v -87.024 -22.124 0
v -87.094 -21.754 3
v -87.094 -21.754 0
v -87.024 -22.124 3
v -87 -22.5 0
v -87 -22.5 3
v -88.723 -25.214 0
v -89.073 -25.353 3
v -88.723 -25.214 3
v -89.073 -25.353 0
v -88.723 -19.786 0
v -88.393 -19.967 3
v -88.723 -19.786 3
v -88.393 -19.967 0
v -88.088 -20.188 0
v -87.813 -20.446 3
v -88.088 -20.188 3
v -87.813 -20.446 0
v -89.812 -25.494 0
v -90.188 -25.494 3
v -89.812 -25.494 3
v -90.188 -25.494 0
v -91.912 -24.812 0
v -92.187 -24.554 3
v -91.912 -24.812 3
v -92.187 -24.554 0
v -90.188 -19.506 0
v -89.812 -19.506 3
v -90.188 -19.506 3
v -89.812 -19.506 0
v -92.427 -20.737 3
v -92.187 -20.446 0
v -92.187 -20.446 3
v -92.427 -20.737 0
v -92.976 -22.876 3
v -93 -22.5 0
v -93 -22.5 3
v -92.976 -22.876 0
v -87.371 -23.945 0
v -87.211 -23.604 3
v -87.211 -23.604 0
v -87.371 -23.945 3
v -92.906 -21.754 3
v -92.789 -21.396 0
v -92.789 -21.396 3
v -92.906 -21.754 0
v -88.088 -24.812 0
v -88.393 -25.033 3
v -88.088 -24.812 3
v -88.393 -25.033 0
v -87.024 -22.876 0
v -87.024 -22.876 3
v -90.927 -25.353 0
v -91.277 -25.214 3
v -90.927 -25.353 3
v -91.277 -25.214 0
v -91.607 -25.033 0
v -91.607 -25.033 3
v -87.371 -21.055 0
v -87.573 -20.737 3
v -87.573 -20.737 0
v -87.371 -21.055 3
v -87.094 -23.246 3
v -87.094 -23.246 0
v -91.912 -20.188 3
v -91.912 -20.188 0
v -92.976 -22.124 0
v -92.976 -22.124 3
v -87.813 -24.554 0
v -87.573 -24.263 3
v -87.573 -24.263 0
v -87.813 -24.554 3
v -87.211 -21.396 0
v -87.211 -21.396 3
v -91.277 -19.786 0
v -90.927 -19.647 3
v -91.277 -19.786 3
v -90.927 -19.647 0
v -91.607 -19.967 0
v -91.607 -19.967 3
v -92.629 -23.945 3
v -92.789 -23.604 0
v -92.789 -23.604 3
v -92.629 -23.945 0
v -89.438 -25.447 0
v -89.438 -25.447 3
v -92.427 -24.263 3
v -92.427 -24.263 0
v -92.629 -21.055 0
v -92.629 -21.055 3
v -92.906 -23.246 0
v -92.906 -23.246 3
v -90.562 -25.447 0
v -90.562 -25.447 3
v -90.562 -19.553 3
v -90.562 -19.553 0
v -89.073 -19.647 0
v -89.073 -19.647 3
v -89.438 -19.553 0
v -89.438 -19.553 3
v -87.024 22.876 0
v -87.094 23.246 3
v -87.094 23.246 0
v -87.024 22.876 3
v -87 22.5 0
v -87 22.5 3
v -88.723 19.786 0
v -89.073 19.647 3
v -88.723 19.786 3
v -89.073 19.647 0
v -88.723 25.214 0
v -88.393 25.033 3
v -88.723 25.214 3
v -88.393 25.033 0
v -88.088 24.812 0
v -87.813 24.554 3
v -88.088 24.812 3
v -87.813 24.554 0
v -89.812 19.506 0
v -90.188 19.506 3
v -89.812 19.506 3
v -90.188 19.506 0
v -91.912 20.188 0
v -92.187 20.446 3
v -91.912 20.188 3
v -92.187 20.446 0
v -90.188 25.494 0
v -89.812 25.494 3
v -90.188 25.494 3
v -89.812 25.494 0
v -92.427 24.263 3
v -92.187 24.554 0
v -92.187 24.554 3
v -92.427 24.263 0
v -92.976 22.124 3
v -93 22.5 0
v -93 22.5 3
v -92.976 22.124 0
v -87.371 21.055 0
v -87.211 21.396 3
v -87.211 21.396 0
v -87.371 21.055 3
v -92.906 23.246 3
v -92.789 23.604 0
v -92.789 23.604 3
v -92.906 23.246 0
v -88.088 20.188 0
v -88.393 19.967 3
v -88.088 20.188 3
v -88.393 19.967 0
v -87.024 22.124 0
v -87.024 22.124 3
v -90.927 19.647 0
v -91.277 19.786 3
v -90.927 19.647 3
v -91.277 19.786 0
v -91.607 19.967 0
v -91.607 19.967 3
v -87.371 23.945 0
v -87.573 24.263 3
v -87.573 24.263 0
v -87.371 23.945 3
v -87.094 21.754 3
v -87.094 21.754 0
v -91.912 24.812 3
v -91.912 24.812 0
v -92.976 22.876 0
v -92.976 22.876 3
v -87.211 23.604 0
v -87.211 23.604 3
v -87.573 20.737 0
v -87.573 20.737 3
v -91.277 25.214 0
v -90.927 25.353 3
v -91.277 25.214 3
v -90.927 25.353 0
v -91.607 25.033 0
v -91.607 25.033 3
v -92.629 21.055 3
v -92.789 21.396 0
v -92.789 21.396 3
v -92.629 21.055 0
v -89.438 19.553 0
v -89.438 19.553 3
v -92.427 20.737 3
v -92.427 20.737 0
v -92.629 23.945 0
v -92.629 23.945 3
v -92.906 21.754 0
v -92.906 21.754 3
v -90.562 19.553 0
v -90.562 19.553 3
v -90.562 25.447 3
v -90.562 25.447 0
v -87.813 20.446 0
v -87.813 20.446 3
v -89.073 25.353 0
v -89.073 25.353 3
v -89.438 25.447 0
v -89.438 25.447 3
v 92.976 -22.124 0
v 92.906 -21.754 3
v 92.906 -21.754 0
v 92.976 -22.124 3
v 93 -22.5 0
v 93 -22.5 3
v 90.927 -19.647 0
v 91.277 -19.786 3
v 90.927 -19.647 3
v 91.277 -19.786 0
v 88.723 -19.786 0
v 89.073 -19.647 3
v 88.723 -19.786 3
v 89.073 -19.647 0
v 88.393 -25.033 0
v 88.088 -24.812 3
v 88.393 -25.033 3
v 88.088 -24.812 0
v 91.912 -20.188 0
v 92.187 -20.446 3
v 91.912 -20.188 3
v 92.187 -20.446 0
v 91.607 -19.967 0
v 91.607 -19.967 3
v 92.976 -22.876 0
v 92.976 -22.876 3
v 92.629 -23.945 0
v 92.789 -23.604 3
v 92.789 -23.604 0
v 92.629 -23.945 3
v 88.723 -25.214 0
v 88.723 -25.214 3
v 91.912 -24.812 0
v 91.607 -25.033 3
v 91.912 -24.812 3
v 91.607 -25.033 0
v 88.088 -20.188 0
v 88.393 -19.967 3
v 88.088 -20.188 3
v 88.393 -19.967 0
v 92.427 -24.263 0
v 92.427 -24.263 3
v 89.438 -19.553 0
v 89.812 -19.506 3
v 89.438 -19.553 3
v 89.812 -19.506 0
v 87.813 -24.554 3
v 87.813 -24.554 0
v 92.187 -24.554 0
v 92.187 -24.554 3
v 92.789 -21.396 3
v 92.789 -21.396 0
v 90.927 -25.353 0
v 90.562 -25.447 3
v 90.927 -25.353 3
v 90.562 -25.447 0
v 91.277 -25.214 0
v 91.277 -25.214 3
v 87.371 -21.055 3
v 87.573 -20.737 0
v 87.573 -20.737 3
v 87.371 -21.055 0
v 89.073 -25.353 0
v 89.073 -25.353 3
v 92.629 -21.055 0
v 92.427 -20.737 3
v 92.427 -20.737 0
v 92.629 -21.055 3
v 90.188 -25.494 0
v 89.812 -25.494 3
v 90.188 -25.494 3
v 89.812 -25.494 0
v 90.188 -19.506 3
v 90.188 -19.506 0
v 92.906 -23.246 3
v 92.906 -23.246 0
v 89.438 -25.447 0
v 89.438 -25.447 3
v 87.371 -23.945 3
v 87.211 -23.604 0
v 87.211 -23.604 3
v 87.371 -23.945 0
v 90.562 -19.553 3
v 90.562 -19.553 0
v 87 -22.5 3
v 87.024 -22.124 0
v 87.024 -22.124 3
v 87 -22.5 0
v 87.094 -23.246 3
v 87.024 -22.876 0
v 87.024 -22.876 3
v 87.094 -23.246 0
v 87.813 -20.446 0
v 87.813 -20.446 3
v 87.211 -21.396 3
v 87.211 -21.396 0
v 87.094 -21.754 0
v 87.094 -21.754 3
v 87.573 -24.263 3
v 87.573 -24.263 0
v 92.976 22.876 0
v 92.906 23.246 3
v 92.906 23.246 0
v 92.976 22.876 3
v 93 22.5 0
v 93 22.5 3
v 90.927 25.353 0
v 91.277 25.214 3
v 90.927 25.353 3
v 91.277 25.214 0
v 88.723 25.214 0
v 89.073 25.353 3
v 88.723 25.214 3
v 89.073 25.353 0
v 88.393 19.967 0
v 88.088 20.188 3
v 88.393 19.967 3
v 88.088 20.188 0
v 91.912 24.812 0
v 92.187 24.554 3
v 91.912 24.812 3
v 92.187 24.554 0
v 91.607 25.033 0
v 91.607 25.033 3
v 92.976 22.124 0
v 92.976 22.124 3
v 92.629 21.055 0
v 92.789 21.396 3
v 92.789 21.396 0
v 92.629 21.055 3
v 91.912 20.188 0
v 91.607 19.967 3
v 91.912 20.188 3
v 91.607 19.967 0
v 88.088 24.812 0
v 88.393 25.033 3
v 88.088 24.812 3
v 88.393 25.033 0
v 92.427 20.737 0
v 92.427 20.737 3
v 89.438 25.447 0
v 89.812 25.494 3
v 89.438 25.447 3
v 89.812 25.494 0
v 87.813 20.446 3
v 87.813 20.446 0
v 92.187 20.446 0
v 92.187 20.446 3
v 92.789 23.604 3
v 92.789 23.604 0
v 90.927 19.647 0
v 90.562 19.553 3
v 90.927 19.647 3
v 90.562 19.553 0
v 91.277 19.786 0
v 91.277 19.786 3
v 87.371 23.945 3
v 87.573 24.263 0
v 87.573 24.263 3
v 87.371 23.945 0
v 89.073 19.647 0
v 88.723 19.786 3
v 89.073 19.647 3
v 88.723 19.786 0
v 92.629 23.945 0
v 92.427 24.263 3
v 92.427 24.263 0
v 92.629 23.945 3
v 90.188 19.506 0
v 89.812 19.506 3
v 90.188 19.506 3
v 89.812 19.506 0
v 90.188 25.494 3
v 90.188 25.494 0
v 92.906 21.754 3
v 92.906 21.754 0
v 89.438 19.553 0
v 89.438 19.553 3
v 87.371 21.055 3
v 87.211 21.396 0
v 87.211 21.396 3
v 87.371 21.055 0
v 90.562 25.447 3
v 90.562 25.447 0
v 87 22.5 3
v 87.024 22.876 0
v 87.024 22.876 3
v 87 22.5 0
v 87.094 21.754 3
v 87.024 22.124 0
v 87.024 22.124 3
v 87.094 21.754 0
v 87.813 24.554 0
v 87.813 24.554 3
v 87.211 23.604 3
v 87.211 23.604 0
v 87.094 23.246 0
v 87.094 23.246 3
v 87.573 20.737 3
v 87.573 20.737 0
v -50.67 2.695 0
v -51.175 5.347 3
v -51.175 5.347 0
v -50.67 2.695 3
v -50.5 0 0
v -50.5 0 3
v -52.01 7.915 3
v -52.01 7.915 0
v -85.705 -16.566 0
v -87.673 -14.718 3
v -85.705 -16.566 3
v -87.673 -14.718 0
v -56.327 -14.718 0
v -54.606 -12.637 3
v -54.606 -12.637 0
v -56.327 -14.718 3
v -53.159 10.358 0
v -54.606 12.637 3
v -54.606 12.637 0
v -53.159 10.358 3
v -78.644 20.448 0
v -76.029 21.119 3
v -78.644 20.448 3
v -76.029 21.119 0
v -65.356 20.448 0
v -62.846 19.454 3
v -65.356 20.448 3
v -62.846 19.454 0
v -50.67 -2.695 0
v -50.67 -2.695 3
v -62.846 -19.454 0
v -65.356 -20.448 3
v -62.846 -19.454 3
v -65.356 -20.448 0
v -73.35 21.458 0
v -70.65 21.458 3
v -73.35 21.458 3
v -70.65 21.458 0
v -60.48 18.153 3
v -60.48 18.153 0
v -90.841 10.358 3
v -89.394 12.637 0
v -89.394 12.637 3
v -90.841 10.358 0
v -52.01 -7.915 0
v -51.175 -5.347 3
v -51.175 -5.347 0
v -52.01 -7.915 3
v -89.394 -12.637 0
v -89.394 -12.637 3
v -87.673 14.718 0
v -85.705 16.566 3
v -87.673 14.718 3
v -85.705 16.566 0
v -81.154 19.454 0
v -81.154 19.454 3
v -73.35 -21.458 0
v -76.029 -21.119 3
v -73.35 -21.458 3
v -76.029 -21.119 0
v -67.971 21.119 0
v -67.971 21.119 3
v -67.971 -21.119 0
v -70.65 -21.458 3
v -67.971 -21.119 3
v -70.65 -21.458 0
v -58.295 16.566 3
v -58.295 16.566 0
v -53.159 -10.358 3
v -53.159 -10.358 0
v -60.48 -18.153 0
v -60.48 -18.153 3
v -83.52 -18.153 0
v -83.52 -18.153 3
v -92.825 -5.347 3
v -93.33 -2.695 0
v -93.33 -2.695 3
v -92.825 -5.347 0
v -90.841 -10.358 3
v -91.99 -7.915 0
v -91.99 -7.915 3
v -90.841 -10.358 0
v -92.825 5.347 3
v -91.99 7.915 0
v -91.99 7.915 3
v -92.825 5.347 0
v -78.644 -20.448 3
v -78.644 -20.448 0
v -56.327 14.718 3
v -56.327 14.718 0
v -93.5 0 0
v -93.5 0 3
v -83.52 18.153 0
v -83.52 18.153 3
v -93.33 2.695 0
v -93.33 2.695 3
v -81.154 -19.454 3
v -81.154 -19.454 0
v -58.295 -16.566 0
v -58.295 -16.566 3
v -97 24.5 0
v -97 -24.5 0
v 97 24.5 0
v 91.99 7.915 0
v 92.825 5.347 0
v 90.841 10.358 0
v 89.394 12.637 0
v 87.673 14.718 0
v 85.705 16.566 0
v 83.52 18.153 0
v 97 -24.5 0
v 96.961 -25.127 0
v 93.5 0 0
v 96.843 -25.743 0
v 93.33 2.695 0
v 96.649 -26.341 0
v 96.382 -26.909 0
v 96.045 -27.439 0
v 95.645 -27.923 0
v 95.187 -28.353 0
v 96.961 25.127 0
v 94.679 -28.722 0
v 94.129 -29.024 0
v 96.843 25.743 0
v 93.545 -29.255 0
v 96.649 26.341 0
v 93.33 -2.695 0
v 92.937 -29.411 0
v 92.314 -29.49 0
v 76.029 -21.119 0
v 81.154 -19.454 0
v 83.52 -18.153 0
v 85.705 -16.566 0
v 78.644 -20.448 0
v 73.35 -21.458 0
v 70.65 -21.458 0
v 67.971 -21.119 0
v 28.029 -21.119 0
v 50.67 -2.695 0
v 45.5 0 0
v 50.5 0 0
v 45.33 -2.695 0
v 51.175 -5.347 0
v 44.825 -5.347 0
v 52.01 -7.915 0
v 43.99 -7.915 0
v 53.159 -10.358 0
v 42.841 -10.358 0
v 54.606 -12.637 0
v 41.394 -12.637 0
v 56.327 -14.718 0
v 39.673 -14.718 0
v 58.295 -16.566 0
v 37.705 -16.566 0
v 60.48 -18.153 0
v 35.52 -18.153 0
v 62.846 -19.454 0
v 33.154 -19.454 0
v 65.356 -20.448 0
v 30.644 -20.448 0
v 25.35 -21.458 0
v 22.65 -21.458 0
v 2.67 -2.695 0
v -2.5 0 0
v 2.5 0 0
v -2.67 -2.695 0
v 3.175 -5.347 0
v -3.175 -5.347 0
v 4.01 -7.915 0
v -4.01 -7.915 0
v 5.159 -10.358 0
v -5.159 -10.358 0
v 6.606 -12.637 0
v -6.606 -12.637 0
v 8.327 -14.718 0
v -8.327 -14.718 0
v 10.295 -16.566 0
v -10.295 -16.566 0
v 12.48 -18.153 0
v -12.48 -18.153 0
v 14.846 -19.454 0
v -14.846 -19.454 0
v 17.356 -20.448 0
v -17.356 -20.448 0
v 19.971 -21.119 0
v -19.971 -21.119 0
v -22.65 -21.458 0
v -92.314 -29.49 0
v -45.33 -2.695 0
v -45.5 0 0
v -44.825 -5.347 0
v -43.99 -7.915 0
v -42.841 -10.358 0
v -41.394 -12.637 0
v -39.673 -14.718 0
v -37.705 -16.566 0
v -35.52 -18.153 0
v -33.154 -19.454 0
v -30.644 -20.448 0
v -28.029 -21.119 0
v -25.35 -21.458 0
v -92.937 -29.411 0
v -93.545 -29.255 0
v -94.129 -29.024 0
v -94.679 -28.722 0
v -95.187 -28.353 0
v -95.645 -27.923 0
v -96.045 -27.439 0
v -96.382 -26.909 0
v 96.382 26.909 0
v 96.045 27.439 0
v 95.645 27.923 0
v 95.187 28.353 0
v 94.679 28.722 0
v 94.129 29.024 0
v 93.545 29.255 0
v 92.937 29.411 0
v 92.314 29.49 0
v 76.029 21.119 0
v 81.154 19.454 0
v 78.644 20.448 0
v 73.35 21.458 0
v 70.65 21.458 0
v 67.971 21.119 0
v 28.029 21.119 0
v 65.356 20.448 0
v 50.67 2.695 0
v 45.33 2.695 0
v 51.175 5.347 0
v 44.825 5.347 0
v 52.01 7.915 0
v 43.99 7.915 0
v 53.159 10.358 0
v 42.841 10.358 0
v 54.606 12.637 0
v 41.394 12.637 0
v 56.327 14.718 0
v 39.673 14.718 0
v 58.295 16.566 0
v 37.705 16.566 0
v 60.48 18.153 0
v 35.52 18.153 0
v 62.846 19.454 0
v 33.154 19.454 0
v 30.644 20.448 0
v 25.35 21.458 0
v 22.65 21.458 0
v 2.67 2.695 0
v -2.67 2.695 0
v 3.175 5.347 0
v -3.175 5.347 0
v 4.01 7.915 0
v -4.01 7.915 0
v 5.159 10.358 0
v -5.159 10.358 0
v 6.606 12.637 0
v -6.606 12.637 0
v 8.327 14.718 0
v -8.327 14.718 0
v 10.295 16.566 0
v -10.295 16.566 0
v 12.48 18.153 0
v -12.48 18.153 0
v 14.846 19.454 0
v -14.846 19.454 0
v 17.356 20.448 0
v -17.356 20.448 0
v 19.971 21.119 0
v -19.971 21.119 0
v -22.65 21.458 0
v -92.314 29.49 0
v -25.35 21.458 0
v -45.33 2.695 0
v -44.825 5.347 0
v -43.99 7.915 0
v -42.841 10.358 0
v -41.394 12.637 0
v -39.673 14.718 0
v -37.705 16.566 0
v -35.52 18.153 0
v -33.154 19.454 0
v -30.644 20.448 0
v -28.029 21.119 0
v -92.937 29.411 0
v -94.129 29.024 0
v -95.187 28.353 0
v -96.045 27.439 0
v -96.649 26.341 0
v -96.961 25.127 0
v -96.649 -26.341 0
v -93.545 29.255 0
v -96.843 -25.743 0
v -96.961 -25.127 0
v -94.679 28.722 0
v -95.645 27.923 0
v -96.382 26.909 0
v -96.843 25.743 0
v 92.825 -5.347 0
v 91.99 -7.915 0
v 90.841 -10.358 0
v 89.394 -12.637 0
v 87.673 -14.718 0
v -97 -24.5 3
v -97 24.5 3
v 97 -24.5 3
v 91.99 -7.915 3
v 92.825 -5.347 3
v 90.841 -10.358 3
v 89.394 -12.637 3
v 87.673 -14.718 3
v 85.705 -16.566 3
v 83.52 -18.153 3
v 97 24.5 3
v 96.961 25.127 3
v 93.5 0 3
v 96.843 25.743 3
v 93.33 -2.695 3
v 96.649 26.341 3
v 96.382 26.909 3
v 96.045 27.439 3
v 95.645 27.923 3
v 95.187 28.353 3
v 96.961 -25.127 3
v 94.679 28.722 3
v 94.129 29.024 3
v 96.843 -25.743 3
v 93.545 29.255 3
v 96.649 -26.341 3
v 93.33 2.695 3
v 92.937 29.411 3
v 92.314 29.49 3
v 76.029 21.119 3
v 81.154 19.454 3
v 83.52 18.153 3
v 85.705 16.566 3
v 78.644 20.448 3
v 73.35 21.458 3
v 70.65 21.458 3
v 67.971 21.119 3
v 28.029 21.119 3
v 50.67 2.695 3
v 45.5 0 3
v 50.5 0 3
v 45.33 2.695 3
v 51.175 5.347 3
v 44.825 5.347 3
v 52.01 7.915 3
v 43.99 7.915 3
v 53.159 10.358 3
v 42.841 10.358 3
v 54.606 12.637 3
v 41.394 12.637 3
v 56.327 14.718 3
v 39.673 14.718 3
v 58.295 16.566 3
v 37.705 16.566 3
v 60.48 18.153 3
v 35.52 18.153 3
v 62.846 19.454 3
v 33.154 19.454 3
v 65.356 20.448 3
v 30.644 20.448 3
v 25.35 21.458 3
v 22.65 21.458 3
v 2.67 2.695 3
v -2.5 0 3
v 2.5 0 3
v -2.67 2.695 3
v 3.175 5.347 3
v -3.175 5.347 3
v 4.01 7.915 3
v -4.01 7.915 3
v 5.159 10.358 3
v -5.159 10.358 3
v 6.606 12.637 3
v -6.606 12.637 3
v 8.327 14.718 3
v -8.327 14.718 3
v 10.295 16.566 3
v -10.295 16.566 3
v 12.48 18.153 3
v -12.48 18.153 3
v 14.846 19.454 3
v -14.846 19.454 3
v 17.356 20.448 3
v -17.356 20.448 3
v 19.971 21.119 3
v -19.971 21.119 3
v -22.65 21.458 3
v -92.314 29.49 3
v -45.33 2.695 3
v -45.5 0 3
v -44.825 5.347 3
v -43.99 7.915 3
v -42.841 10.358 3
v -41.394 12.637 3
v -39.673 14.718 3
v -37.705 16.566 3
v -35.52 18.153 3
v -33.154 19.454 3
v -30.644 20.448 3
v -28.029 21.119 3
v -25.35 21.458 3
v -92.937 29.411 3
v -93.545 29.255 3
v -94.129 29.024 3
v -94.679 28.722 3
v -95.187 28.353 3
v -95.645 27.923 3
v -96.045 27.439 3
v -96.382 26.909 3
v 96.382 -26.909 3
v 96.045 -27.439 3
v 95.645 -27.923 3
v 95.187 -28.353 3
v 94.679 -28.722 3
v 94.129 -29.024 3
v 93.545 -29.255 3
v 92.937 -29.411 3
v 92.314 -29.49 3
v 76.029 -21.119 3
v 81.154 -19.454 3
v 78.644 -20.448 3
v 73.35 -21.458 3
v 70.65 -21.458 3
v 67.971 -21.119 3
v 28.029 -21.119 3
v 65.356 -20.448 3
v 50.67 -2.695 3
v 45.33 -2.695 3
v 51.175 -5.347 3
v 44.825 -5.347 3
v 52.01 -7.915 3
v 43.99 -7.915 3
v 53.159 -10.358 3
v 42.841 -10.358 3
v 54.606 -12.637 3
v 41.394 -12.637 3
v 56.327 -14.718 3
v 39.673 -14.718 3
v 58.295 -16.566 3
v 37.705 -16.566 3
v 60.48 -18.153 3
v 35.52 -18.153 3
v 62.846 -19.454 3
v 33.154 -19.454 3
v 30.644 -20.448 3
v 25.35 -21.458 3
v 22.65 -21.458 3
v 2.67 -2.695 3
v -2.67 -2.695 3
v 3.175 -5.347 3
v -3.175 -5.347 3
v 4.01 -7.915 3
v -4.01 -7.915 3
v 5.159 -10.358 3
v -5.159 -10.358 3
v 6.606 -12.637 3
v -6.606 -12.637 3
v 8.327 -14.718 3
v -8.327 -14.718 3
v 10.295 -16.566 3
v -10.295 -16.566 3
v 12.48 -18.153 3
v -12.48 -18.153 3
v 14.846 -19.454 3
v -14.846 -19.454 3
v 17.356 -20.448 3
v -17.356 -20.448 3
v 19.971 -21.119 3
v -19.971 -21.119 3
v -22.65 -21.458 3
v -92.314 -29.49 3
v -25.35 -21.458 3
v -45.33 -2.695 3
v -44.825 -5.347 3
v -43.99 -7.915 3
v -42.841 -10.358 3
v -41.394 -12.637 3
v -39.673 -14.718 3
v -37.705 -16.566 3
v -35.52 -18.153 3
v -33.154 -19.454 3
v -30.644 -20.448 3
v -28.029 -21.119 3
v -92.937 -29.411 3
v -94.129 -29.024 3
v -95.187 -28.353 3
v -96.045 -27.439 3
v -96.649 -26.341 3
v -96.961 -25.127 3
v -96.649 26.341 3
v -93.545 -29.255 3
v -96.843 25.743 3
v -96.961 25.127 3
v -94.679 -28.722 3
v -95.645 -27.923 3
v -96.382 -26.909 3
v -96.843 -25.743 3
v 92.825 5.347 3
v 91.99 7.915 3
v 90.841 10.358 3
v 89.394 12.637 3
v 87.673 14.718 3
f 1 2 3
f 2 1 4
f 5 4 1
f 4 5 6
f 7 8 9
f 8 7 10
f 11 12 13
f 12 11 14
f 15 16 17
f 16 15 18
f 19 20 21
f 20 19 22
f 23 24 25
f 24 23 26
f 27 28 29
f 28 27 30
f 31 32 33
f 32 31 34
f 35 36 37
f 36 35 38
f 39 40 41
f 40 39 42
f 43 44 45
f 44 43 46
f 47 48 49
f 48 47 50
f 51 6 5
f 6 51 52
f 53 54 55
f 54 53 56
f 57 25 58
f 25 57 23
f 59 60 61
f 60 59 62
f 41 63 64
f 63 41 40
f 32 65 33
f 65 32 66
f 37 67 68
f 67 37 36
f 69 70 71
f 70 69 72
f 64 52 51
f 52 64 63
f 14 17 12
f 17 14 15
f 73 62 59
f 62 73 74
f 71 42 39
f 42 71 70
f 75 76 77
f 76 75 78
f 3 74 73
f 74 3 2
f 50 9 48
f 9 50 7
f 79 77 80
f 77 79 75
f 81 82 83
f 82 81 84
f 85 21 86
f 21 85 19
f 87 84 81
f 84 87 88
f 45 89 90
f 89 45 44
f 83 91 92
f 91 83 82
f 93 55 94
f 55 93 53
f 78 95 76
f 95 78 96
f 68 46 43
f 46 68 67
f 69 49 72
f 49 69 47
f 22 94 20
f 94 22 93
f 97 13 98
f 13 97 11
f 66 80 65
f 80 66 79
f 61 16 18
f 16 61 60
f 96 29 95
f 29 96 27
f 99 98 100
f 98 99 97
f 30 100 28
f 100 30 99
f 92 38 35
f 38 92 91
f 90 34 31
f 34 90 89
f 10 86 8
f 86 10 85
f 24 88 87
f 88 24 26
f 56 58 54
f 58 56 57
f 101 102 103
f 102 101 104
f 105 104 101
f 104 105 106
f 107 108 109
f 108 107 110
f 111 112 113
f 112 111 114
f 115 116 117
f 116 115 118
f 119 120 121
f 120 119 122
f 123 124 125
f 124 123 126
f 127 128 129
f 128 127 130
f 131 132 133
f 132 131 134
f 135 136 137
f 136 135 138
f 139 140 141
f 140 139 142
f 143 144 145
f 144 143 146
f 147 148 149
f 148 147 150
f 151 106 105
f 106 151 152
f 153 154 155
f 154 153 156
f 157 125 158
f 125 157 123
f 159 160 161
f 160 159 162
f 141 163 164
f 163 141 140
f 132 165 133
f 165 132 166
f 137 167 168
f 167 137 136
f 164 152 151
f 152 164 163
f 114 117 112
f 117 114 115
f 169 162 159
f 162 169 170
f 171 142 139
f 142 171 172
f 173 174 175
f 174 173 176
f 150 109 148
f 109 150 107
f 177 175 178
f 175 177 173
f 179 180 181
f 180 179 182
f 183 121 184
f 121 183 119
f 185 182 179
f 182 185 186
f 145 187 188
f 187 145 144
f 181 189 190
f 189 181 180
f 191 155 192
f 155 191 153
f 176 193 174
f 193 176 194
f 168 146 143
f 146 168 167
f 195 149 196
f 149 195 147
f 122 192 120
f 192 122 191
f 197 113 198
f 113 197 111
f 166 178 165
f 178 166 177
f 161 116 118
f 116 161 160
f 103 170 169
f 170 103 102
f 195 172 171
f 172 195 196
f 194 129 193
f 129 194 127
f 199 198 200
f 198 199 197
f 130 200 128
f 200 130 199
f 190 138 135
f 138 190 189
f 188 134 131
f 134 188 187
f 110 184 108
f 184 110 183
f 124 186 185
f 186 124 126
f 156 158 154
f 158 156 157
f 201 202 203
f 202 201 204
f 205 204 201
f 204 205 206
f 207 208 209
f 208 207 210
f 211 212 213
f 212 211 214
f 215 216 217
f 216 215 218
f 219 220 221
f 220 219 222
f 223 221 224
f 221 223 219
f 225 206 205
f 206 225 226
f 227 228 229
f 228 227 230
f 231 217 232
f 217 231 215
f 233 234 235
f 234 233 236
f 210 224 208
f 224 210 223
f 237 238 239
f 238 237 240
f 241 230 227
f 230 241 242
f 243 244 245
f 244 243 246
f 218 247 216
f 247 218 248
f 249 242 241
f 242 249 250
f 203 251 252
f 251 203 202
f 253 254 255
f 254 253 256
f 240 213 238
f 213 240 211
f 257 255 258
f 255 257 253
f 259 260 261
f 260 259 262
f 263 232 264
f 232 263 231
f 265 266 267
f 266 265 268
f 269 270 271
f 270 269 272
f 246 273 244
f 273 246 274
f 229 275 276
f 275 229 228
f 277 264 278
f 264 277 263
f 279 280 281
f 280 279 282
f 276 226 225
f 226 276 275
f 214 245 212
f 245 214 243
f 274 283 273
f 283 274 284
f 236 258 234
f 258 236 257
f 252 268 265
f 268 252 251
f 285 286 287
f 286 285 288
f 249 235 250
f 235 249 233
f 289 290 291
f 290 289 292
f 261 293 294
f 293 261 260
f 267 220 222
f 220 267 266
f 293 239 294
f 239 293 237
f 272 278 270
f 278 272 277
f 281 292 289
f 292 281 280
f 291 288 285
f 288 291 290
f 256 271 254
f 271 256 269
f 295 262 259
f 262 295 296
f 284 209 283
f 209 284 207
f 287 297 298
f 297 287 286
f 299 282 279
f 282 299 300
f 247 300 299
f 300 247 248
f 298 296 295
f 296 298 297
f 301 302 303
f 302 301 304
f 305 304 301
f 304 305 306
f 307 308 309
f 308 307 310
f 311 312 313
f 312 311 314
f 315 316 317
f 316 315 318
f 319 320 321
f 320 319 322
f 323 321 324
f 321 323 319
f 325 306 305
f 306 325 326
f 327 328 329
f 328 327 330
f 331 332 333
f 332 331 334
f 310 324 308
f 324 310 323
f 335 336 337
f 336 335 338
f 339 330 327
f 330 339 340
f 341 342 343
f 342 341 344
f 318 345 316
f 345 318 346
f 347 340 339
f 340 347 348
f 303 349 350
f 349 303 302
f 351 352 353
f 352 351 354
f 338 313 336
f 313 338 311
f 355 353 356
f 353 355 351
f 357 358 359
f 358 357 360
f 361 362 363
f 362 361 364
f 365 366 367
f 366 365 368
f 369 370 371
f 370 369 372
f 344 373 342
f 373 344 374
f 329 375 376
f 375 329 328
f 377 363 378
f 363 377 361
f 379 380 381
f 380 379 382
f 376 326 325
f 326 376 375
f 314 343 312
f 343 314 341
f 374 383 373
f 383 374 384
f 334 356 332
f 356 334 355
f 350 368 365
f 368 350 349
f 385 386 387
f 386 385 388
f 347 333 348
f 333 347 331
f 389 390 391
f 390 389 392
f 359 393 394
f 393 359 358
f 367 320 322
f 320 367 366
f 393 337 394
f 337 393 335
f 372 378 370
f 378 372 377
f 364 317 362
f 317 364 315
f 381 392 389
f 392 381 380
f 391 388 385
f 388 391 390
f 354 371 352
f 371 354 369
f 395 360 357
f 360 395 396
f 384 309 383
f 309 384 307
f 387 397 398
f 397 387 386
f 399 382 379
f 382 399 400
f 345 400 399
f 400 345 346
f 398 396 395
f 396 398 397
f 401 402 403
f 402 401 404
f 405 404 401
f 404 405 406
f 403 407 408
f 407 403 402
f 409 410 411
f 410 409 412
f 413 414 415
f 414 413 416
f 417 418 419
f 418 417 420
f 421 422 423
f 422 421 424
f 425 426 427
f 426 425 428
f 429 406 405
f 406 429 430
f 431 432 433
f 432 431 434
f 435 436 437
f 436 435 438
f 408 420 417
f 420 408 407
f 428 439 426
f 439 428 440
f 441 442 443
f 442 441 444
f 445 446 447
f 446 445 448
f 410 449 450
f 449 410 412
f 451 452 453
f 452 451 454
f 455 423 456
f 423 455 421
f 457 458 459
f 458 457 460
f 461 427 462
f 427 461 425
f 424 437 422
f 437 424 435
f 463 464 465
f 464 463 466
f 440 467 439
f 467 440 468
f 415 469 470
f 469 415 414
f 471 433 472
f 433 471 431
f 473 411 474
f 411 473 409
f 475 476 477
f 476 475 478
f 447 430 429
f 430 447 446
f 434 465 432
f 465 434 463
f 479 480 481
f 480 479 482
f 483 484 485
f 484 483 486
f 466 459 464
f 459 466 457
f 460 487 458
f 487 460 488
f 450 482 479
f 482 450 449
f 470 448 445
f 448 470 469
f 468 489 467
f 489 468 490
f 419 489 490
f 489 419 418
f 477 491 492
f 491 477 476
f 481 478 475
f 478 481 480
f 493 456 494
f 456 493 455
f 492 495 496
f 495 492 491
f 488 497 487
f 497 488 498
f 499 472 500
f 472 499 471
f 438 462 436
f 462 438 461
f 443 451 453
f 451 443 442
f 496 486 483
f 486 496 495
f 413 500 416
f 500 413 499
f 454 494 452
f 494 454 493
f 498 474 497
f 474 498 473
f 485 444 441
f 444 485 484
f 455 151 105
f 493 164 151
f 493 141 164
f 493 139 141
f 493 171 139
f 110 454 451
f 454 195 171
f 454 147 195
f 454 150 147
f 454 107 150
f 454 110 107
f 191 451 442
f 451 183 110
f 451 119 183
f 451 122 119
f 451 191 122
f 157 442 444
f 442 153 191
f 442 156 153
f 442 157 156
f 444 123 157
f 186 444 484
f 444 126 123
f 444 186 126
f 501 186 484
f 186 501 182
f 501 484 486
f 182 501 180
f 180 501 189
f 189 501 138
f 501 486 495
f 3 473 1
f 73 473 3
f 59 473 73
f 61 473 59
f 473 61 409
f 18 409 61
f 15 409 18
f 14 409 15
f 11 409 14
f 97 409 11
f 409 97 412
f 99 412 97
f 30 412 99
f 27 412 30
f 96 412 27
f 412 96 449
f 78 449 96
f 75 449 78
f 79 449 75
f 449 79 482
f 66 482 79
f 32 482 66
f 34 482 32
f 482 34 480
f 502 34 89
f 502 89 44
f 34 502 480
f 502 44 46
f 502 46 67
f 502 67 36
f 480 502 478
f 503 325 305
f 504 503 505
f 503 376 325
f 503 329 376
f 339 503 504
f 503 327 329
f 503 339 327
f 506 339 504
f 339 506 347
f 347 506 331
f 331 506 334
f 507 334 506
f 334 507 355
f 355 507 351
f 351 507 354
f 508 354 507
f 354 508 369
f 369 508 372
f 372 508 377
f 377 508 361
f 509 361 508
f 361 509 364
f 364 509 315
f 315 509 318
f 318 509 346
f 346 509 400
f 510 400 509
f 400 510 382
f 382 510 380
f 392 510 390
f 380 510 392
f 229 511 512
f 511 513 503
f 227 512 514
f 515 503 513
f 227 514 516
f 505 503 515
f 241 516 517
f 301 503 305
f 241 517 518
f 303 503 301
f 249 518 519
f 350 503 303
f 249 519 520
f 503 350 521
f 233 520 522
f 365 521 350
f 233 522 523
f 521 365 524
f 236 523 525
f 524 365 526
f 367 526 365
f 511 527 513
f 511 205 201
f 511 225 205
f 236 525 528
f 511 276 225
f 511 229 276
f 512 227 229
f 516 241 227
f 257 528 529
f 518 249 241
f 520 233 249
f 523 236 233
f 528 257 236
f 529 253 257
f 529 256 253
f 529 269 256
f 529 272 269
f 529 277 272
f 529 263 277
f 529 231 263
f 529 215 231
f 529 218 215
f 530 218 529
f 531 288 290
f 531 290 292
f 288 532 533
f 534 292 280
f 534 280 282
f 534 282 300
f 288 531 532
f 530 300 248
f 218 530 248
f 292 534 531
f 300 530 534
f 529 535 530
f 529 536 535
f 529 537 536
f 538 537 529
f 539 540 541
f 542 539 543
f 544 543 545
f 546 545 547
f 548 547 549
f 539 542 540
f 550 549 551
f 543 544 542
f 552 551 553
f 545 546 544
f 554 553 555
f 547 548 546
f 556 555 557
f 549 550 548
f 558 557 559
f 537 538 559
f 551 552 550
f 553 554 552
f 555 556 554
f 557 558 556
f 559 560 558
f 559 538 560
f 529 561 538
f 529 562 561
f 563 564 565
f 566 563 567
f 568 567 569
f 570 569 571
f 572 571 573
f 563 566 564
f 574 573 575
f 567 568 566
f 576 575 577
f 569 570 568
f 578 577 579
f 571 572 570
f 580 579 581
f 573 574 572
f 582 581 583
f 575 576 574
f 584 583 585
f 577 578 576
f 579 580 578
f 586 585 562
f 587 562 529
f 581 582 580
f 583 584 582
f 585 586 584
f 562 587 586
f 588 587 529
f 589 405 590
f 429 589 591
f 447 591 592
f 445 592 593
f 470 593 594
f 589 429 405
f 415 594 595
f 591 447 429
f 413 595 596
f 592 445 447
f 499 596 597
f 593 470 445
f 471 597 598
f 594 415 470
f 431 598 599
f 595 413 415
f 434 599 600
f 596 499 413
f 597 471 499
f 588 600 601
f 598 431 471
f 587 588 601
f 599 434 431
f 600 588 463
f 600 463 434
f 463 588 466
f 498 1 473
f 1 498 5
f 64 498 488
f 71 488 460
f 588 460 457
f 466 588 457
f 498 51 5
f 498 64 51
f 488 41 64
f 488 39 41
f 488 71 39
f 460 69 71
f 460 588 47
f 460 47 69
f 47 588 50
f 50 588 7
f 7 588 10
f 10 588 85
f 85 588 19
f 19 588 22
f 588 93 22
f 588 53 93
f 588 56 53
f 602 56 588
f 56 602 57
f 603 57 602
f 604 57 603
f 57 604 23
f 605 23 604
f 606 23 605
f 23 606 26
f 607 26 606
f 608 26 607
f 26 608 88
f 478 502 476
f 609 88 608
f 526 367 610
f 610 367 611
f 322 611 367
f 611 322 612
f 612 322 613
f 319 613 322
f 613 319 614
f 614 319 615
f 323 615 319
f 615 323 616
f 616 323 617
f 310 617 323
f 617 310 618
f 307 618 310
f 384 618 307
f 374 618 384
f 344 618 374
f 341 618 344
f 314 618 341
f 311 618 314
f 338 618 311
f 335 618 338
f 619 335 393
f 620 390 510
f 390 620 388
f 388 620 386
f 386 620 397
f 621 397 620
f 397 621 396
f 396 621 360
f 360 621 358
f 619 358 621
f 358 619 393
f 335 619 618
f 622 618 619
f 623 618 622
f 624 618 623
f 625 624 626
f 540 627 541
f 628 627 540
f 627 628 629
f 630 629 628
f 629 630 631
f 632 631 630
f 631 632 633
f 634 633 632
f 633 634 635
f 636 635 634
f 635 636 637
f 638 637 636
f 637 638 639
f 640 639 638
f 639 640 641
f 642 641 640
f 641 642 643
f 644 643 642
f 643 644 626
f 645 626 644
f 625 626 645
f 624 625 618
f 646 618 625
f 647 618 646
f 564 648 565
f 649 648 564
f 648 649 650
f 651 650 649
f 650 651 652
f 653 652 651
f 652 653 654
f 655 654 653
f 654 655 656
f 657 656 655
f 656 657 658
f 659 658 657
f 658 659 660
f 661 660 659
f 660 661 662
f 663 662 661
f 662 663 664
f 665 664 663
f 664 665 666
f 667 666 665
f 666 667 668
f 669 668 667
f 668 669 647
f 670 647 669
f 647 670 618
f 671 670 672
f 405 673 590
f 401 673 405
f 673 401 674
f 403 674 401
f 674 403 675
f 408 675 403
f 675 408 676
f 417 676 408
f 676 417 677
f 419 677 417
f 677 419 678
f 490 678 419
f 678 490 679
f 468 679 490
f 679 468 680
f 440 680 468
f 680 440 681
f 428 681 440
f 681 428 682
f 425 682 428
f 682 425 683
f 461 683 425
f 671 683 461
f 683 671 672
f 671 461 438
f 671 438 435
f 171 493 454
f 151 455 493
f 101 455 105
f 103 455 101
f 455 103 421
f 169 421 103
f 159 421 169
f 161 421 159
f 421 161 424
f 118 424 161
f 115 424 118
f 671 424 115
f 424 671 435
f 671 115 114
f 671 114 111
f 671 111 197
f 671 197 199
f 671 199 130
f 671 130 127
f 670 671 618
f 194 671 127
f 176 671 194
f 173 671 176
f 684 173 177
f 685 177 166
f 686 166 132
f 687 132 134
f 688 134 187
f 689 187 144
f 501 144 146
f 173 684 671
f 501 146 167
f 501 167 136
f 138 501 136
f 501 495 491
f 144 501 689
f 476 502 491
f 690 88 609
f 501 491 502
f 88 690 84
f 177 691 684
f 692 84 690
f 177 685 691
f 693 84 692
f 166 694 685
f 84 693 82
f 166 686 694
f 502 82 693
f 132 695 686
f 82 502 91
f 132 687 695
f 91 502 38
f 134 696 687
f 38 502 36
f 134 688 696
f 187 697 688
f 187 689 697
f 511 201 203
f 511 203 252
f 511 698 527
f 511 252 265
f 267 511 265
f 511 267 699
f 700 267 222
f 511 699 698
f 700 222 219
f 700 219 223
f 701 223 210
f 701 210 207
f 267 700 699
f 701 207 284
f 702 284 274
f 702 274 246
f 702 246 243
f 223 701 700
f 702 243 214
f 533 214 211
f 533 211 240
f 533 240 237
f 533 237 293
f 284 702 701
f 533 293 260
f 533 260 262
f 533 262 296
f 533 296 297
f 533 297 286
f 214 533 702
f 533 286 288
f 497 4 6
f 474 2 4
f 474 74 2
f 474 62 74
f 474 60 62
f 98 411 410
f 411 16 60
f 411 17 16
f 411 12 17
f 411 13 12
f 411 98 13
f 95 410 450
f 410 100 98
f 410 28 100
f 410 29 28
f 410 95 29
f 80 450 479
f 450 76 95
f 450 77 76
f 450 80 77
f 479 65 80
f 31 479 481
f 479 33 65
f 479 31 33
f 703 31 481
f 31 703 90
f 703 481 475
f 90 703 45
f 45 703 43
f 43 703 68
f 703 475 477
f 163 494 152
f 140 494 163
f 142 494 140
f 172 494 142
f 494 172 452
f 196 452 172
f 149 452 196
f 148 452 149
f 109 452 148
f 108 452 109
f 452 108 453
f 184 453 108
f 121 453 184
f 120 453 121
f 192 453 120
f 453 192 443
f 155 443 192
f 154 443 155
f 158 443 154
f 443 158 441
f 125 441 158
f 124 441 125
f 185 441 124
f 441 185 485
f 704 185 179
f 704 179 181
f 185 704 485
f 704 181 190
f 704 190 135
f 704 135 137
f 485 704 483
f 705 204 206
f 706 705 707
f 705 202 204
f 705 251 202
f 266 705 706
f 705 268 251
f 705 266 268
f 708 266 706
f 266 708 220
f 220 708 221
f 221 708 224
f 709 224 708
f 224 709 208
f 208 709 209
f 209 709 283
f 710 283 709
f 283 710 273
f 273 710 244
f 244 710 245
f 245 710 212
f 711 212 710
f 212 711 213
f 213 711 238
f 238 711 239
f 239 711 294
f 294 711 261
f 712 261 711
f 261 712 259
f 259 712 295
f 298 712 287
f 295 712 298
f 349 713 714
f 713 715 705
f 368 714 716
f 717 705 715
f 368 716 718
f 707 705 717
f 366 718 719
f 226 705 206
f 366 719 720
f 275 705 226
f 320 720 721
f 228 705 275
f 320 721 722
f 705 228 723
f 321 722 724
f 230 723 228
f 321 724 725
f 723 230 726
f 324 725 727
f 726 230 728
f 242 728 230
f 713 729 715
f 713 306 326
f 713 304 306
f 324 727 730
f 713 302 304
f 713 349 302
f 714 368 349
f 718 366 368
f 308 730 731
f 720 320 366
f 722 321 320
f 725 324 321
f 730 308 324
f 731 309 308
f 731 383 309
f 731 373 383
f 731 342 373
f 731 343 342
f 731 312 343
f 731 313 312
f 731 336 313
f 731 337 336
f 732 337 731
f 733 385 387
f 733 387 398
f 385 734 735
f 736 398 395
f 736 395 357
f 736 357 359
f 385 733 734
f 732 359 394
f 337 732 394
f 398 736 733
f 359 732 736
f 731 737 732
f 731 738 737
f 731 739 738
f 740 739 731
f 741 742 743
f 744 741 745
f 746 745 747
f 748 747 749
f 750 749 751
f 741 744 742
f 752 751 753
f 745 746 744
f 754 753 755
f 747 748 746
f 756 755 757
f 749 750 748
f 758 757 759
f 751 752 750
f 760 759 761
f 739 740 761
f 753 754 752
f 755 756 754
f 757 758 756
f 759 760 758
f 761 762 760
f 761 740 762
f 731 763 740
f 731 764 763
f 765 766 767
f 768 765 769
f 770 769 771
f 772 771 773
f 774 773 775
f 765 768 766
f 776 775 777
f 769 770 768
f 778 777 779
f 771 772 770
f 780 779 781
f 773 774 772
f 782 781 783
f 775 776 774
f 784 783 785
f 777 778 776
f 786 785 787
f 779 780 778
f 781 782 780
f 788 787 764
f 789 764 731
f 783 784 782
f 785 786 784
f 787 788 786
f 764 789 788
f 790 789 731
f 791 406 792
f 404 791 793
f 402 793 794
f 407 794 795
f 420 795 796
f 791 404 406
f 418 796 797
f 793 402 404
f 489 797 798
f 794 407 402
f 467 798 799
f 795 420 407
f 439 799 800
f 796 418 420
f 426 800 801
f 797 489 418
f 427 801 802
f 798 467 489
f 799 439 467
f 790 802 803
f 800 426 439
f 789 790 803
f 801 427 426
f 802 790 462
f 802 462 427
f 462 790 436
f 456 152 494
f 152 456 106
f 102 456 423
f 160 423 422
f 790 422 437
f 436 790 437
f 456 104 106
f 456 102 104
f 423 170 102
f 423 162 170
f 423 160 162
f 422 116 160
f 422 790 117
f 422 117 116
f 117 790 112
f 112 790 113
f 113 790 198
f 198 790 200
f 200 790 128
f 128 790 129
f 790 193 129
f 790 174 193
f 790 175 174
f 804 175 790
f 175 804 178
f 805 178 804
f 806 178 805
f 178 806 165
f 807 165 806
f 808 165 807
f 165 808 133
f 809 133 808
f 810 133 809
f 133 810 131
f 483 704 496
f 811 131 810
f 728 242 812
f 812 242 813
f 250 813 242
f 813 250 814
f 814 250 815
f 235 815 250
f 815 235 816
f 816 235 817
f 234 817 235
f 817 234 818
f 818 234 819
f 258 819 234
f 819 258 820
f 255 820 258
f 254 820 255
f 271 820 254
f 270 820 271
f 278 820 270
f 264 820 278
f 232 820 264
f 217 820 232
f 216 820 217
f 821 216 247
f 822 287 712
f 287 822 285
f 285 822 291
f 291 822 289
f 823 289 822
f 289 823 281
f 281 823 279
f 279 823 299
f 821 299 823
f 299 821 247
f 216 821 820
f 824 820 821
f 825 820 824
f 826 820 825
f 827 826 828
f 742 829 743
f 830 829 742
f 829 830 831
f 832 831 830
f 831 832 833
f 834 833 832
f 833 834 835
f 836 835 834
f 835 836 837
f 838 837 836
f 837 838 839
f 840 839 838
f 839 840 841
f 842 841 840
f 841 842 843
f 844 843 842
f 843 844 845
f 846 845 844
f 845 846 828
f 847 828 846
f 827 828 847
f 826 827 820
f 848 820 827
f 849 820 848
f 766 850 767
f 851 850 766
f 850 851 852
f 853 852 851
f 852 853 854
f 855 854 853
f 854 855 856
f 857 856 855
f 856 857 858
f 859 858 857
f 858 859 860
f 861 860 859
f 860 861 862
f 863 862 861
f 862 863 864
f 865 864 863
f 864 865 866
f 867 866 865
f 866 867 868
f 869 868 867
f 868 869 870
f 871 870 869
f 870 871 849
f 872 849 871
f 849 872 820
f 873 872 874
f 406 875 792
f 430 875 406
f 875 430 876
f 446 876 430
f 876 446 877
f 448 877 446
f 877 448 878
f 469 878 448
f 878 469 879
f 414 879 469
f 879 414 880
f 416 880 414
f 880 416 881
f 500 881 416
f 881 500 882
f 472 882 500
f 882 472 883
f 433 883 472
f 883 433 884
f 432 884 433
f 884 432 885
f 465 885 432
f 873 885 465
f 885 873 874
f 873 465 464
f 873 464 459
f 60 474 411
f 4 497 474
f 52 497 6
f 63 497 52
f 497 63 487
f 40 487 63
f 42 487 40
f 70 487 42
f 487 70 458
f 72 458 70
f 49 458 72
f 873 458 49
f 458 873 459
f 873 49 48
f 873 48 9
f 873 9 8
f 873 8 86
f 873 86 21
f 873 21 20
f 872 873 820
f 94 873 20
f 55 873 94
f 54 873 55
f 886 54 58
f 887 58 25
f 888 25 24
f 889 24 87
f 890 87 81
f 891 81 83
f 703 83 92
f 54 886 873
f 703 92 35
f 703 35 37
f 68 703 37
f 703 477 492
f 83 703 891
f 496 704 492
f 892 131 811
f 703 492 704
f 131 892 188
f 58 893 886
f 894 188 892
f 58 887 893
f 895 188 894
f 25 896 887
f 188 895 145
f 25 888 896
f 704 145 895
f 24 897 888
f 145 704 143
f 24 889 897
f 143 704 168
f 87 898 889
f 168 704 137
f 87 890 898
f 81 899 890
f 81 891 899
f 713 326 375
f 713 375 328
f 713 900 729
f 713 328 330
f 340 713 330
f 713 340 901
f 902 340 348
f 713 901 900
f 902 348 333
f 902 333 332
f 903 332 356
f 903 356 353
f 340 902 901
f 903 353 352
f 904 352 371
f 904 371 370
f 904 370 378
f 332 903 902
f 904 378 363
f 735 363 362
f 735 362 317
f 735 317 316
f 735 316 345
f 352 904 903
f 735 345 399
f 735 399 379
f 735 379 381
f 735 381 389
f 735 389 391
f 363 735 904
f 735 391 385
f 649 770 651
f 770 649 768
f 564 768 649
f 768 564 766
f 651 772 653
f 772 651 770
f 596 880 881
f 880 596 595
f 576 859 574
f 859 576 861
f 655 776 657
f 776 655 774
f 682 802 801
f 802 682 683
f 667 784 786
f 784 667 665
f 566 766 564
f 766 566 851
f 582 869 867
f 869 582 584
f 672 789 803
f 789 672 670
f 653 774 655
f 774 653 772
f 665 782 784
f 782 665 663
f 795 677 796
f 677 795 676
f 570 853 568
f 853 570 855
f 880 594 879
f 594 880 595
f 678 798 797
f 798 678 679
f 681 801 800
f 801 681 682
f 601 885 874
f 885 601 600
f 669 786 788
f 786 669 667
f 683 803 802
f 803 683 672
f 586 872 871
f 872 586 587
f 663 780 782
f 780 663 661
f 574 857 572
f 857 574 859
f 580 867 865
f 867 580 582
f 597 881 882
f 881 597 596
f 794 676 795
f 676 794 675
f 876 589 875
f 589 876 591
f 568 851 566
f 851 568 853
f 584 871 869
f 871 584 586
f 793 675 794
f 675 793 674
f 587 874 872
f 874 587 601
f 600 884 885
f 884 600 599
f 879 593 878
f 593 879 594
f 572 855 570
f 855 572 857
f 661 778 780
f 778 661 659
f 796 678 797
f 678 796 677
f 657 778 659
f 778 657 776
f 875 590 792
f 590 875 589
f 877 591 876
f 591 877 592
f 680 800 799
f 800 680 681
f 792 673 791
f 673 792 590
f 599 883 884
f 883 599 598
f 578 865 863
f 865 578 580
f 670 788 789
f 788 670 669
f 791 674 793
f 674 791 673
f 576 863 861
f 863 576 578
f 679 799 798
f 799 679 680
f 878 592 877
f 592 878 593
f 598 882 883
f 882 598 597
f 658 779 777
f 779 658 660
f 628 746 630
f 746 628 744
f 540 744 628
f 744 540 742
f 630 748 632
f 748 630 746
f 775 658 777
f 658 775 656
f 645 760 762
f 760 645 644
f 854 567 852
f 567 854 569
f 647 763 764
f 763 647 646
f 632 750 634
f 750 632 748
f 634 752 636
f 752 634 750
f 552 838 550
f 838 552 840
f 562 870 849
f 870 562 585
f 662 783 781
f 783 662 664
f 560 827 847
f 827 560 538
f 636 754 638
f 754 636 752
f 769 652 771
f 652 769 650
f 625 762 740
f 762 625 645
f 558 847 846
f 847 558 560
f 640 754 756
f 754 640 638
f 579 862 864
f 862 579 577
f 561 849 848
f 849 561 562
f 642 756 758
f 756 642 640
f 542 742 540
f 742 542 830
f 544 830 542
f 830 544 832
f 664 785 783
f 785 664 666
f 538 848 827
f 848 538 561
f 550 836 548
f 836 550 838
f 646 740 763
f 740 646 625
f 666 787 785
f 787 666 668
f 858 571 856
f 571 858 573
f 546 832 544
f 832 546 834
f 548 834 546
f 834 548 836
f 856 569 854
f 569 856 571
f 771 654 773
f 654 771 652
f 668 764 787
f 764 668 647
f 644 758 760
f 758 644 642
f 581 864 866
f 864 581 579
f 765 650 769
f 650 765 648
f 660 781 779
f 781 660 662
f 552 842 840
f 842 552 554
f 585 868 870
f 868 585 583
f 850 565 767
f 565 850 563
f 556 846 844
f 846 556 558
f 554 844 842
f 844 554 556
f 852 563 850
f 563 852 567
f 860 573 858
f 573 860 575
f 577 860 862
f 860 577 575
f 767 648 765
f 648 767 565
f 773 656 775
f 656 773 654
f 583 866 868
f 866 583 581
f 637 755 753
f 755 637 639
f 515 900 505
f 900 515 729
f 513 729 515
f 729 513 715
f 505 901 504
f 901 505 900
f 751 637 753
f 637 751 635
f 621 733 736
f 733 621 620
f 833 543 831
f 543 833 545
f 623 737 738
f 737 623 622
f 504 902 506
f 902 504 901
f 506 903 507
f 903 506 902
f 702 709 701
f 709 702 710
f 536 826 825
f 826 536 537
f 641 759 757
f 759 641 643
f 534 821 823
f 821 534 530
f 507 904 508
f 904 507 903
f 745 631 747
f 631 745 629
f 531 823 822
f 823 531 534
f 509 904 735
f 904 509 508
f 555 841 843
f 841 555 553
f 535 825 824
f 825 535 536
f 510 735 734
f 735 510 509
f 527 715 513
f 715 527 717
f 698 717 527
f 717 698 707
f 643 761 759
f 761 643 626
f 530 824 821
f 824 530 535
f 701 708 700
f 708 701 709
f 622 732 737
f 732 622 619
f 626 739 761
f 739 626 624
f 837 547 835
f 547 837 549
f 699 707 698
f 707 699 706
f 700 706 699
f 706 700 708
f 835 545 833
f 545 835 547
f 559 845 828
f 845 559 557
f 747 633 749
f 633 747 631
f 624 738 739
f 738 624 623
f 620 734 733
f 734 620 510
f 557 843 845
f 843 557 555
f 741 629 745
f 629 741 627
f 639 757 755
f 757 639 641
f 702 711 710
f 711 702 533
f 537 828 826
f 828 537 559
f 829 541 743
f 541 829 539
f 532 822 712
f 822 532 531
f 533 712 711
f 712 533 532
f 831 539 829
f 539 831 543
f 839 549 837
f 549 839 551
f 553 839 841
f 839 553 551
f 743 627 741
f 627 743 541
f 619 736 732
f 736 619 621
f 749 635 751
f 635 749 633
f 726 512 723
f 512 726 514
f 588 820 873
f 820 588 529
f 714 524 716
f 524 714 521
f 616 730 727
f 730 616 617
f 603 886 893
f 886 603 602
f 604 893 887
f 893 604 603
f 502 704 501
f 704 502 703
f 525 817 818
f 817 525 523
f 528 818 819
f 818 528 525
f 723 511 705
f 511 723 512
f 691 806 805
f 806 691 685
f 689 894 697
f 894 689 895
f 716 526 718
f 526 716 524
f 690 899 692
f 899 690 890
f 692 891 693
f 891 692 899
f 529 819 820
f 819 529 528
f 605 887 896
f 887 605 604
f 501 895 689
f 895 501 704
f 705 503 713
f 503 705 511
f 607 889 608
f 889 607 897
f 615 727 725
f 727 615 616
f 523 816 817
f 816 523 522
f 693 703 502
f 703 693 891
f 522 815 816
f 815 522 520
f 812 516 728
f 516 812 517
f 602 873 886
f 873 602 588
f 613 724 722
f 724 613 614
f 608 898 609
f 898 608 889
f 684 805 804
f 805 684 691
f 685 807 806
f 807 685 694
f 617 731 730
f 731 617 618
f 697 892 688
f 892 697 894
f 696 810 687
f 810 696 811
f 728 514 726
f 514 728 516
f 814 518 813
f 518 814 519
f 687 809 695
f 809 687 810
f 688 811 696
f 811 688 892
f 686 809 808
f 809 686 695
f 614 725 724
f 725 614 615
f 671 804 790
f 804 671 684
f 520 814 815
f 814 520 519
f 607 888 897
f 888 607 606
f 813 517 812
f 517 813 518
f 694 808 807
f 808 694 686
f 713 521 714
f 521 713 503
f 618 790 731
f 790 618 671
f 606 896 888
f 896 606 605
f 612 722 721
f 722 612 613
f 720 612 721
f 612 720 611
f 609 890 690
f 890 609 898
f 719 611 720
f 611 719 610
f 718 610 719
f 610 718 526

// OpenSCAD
$fn = 50;


difference() {
	union() {
		hull() {
			translate(v = [-92.0000000000, 24.5000000000, 0]) {
				cylinder(h = 3, r = 5);
			}
			translate(v = [92.0000000000, 24.5000000000, 0]) {
				cylinder(h = 3, r = 5);
			}
			translate(v = [-92.0000000000, -24.5000000000, 0]) {
				cylinder(h = 3, r = 5);
			}
			translate(v = [92.0000000000, -24.5000000000, 0]) {
				cylinder(h = 3, r = 5);
			}
		}
	}
	union() {
		#translate(v = [-90.0000000000, -22.5000000000, -100.0000000000]) {
			cylinder(h = 200, r = 3.0000000000);
		}
		#translate(v = [-90.0000000000, 22.5000000000, -100.0000000000]) {
			cylinder(h = 200, r = 3.0000000000);
		}
		#translate(v = [90.0000000000, -22.5000000000, -100.0000000000]) {
			cylinder(h = 200, r = 3.0000000000);
		}
		#translate(v = [90.0000000000, 22.5000000000, -100.0000000000]) {
			cylinder(h = 200, r = 3.0000000000);
		}
		#translate(v = [-72.0000000000, 0, 0]) {
			cylinder(h = 3, r = 21.5000000000);
		}
		#translate(v = [-24.0000000000, 0, 0]) {
			cylinder(h = 3, r = 21.5000000000);
		}
		#translate(v = [24.0000000000, 0, 0]) {
			cylinder(h = 3, r = 21.5000000000);
		}
		#translate(v = [72.0000000000, 0, 0]) {
			cylinder(h = 3, r = 21.5000000000);
		}
	}
}
